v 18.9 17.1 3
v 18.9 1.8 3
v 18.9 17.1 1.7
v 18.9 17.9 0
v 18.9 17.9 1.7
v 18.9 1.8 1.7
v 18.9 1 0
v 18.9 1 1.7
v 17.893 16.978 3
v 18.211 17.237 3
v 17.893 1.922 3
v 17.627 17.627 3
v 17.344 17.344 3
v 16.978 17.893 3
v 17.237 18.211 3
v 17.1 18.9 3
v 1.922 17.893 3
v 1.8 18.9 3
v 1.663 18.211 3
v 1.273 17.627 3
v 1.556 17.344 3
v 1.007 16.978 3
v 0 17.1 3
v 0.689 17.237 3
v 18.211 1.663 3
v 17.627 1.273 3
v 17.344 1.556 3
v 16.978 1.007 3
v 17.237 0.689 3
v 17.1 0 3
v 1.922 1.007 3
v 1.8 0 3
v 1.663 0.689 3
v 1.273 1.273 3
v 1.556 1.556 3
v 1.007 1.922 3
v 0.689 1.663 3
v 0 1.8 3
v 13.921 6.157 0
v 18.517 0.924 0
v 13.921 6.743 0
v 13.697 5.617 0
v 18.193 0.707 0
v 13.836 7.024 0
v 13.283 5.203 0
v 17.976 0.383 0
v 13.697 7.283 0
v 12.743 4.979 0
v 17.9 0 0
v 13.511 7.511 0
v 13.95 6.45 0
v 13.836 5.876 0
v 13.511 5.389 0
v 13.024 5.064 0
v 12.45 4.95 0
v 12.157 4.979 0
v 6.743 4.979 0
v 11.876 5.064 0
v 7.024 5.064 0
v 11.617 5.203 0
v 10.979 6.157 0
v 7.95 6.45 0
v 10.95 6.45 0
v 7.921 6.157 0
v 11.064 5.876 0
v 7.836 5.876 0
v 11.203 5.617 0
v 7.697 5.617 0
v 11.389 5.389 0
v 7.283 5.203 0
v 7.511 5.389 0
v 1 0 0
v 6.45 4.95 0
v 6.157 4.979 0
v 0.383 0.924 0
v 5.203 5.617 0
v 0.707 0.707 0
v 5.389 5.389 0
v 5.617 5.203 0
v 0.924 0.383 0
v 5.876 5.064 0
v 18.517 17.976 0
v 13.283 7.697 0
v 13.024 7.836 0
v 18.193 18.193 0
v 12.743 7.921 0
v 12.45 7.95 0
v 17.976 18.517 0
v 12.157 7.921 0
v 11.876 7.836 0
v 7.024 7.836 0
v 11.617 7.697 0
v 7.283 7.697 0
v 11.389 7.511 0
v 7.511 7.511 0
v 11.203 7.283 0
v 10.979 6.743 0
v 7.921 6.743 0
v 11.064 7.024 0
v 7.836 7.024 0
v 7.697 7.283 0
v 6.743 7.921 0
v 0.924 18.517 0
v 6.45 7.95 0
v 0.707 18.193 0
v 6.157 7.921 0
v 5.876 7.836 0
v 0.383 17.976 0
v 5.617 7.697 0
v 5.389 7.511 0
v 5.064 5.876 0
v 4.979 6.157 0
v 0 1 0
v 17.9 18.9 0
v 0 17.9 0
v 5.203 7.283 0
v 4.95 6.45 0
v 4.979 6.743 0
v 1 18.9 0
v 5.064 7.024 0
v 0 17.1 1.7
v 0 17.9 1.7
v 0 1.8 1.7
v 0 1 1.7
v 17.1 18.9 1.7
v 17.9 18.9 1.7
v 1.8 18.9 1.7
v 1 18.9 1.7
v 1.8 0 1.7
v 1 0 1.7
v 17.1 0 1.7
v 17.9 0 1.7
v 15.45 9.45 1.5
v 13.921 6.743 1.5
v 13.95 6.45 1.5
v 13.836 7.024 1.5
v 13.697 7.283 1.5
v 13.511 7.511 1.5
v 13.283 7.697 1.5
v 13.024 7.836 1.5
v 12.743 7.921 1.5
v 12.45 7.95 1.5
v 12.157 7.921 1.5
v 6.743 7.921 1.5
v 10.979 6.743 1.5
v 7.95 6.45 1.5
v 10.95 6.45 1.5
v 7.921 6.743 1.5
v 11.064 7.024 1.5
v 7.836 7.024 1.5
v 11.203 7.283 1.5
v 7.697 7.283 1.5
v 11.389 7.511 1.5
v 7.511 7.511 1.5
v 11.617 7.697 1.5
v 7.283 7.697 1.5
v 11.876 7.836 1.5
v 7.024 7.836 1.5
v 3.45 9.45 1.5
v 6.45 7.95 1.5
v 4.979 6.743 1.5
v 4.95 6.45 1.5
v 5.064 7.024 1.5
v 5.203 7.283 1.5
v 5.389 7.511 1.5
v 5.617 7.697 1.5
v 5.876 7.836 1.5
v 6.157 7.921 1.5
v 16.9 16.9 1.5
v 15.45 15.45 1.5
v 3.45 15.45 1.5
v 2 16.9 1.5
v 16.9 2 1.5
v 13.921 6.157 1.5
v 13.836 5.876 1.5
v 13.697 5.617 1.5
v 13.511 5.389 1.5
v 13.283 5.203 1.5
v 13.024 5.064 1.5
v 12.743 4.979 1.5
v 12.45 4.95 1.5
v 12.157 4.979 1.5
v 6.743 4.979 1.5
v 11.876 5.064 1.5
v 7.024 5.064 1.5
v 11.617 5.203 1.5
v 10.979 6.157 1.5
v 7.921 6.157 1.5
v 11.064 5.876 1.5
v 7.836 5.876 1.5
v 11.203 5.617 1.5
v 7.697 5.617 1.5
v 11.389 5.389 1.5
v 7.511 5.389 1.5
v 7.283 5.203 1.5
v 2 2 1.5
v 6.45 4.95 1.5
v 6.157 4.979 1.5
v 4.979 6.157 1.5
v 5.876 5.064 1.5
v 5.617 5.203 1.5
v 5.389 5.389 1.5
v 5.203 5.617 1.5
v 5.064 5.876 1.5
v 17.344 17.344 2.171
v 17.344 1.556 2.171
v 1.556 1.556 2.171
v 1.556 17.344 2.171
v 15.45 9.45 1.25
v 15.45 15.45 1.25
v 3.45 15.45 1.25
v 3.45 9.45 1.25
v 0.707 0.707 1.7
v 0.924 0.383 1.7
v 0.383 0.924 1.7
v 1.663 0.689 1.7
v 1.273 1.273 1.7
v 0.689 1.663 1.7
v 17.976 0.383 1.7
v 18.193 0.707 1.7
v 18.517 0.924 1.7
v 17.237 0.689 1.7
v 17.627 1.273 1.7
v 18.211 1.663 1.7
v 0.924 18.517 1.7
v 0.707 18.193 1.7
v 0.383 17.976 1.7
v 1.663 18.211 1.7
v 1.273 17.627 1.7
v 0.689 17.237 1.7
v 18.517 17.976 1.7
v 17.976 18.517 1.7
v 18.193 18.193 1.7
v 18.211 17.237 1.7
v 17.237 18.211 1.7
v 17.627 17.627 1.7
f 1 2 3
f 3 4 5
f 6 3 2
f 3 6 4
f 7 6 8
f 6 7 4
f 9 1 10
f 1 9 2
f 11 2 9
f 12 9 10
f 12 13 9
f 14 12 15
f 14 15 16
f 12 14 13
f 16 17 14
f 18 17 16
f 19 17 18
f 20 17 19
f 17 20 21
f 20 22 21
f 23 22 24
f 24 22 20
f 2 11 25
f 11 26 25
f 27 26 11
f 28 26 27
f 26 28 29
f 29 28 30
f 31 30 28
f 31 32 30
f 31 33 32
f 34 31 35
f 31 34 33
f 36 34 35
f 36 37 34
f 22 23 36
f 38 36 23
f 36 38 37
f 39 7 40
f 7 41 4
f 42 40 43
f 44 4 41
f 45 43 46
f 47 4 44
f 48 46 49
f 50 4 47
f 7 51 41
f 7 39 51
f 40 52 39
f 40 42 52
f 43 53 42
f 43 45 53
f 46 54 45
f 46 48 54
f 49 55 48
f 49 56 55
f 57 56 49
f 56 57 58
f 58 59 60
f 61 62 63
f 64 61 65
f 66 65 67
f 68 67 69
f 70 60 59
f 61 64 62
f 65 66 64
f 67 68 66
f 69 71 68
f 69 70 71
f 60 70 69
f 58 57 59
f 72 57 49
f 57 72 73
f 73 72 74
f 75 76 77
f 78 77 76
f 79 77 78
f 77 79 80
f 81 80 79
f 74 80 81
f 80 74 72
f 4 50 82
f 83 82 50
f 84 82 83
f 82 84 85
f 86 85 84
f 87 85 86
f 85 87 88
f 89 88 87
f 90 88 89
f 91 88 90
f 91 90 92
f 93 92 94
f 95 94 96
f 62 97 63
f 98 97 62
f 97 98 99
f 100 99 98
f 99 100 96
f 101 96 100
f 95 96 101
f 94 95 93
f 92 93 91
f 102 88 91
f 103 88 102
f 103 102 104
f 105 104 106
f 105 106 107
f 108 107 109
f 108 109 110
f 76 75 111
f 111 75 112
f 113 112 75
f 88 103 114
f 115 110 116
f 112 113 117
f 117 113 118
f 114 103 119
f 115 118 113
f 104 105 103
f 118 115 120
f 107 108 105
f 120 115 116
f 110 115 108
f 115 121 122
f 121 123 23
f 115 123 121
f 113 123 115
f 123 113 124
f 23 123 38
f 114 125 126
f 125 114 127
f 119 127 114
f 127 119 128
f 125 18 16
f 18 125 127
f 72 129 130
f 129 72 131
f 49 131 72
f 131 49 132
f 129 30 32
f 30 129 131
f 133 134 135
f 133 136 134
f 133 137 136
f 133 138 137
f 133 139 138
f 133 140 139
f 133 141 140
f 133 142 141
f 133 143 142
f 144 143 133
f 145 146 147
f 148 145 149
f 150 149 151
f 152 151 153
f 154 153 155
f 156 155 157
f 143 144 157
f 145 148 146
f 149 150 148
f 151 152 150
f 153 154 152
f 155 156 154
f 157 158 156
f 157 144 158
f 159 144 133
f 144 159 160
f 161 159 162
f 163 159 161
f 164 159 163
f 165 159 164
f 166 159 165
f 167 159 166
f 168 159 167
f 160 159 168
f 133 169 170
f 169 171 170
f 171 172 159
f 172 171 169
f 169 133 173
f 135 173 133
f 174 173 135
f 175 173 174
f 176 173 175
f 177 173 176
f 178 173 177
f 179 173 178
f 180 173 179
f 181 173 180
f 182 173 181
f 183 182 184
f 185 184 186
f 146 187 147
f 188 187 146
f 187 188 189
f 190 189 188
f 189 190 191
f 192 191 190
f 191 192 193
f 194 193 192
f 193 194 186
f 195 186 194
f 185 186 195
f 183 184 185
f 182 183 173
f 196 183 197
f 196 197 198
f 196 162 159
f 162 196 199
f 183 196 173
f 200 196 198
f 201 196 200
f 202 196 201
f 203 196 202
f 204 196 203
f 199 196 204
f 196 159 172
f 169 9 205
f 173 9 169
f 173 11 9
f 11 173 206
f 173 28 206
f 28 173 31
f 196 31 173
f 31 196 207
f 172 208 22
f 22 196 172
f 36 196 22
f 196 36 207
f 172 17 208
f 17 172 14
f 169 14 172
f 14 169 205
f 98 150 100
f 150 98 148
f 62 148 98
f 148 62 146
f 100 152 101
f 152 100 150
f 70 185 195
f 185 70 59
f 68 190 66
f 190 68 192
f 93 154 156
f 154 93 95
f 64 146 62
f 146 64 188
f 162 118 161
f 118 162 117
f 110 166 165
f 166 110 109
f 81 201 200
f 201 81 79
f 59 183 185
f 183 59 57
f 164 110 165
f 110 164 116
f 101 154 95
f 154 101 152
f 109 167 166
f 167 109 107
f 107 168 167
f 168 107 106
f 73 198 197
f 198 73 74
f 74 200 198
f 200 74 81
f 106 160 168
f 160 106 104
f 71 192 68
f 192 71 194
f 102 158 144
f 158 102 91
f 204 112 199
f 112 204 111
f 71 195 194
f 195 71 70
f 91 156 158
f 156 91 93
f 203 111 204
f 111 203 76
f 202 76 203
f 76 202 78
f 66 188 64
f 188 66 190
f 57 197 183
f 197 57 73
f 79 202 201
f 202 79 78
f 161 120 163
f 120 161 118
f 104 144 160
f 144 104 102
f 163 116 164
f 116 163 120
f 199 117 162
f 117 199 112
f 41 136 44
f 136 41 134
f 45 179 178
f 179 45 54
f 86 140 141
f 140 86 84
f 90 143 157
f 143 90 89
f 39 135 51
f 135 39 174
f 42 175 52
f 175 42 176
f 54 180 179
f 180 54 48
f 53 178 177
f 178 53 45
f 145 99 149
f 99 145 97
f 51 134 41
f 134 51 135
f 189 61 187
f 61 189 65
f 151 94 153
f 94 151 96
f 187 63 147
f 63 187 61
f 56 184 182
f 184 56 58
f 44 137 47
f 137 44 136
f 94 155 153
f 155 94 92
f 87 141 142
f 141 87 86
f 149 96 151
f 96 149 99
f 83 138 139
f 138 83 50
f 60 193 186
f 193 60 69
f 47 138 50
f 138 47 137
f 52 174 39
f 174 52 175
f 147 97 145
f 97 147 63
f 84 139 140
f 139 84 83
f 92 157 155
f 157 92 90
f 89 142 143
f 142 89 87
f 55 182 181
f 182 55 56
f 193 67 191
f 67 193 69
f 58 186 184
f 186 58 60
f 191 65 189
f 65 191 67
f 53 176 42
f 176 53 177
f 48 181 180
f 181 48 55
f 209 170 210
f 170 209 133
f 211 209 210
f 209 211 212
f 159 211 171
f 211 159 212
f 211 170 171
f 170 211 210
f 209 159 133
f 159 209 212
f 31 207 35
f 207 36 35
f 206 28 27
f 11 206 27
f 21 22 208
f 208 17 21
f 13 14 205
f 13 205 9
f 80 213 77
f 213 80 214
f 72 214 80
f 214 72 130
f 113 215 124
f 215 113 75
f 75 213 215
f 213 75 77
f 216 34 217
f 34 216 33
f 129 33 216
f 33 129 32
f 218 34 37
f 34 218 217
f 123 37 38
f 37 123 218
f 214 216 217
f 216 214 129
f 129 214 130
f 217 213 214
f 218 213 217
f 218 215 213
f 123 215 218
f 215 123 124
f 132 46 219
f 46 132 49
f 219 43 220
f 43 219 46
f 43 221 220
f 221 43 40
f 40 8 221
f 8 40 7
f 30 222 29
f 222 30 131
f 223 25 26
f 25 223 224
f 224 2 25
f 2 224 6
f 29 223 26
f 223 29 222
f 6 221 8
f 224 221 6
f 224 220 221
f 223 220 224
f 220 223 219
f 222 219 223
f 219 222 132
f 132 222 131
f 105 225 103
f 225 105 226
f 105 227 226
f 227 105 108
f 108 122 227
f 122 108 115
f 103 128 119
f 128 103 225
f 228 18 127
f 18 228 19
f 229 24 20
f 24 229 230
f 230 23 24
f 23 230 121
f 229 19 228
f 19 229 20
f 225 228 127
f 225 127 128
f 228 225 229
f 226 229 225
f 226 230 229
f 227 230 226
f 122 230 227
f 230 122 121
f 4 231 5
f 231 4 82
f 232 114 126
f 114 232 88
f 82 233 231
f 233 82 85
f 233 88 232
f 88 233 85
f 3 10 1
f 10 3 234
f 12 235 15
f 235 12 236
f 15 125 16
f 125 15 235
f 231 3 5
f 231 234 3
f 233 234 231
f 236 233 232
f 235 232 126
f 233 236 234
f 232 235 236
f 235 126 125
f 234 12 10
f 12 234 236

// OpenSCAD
//OpenSCAD-Skript

//Moduldefinition mit Parametern für Frontplattensystem im 19mm-Raster
module FrontElem (
//Frontplattenelement
xwert=1,        //Anzahl der Segmente in horizontaler Richtung
ywert=1,        //Anzahl der Segmente in vertikaler Richtung
segment=18.9,   //Kantenlänge des Segments
hght=3.0,       //Höhe des Rands des Frontplattensegments
thick=1.5,      //verbleibende Dicke des Frontplattensegments
wo=1.0,         //Wandstärke oben
wu=2.0,         //Wandstärke unten
//M3-Schrauben
M3=false,       //Bohrungen für M3-Zylinderkopf-Inbusschraube
skd3=5.6,       //Schraubenkopfdurchmesser M3-Schraube
skh3=3.3,       //Schraubenkopfhöhe M3-Schraube
dsh3=3.1,       //Schaftdurchmesser M3-Schraube
dvst3=7,        //Verstärkung für M3-Schraube
//Schneidschrauben 2mmx6mm
B2mm=true,      //Bohrungen für 2mm-Schneidschrauben
skd2=3.6,       //Schraubenkopfdurchmesser 2mm-Schraube (4.4)
skh2=1.3,       //Schraubenkopfhöhe 2mm-Schraube
dsh2=2.0,       //Schaftdurchmesser 2mm-Schraube
dvst2=4.4,      //Verstärkung für 2mm-Schraube
//Beschriftungsfeld eingesenkt
Btext=6.0,      //Breite Beschriftungsband
Ltext=12,       //Länge Beschriftungsband
Dtext=0.3,      //Tiefe Beschriftungsfeld, oder Null
//LED 3mm
LEDdia=3.0,     //Durchmesser LED
//Quadrat-LED
LEDr=5.0,       //Kantenlänge quadratische LED
//Rechteck-LED
LEDB=5.0,       //Breite der Rechteck-LED
LEDH=3.0,       //Höhe der Rechteck-LED
//Hebel-Kippschalter
KSWdia=6.0,     //Schaftdurchmesser Kippschalter
//Drehschalter
RSWdia=9.2,     //Schaftdurchmesser Drehschalter
RSWdist=9.4,    //Mittenabstand Pin
RSWpin=3.0,     //Durchmesser Pin
//Bohrung für Potischaft 6mm
POTdia=6.8,     //Schaftdurchmesser Poti
//Polklemme M4
TRMdia=4.0,     //Bohrung für Polklemme M4
TRSdia=6.0,     //Bohrung für Telefonbuchse 4mm
//MC-Einbaubuchse
MCdia=11.8,     //Bohrung für MC-Buchse 4mm
MCdist=10.4,    //Abstand Abflachungen
//BNC-Einbaubuchse
BNCdia=9.5,     //Durchmesser Bohrung
BNCdist=8.0,    //Abstand Abflachung
//Panelmeter 3-stellig
PM3B=22.5,      //Breite Panelmeter 3-stellig
PM3H=14.5,      //Höhe Panelmeter 3-stellig
//Panelmeter 4-stellig
PM4B=30.0,      //Breite Panelmeter 4-stellig
PM4H=14.2,      //Höhe Panelmeter 4-stellig
//Kaltgerätestecker
KGSW=27.3,      //Länge Ausschnitt in x-Richtung Kaltgerätestecker
KGSH=20,        //Höhe Ausschnitt in y-Richtung Kaltgerätestecker
KGSR=9          //Rundungsdurchmesser Ausschnitt Kaltgerätestecker

)
//Beginn Modul
{
difference(){   //difference 1
union(){        //union 1
difference(){   //difference 2
union(){        //union 2
    //alles, was vor der nächsten geschweiften Klammer steht, wird zusammengefügt (union 2)
//Körper des Frontplattensegments
cube([xwert*segment, ywert*segment, hght]);


}               //union 2 end
    //alles, was vor der nächsten geschweiften Klammer steht, wird davon abgezogen (difference 2)
//Einsenkung in das Segment
polyhedron(
               points= [[wu,wu,thick],                                  //0 unten
                        [xwert*segment-wu,wu,thick],                    //1 unten
                        [xwert*segment-wu,ywert*segment-wu,thick],      //2 unten
                        [wu,ywert*segment-wu,thick],                    //3 unten
                        [wo,wo,hght+0.01],                              //4 oben
                        [wo,ywert*segment-wo, hght+0.01],               //5 oben
                        [xwert*segment-wo,ywert*segment-wo,hght+0.01],  //6 oben
                        [xwert*segment-wo,wo,hght+0.01],                //7 oben
                       ],
               faces=  [[0,1,2,3],      //Boden
                        [0,4,7,1],      //Deckel
                        [1,7,6,2],      //Front
                        [2,6,5,3],      //Seitenwand rechts
                        [3,5,4,0],      //Rückwand
                        [4,5,6,7]]      //Seitenwand links
               );   
/*
//Bohrung für LED mittig (Mindestgröße 1x1)
translate([xwert*segment/2,ywert*segment/2-3,-0.1])  cylinder(d=LEDdia, h=10, $fn=32);
*/


//Bohrung für 2x 3mm-LED nach unten versetzt mit Textfeld darüber (Mindestgröße 1x1, bei 10mm LED 1x2)
translate([xwert*segment/2-3,ywert*segment/2-3,-0.1])  cylinder(d=LEDdia, h=10, $fn=32);
translate([xwert*segment/2+3,ywert*segment/2-3,-0.1])  cylinder(d=LEDdia, h=10, $fn=32);
translate([xwert*segment/2-Ltext/2,ywert*segment/2,thick-Dtext+0.05])  cube([Ltext, Btext, Dtext]); 


/*
//Bohrung für Kippschalter mittig (Mindestgröße 1x1)
translate([xwert*segment/2,ywert*segment/2,-0.1])  cylinder(d=KSWdia, h=10, $fn=32); 
*/

/*
//Bohrungen für Drehschalter mit Pin (Mindestgröße 2x2)
translate([xwert*segment/2,ywert*segment/2,-0.1])  cylinder(d=RSWdia, h=10, $fn=32);
translate([xwert*segment/2+RSWdist,ywert*segment/2,-0.1])  cylinder(d=RSWpin, h=1.5, $fn=32);
*/

/*
//Bohrung für Potentiometer 3mm-Schaft (Mindestgröße 1x1)
translate([xwert*segment/2,ywert*segment/2,-0.1])  cylinder(d=POTdia, h=10, $fn=32);
*/

/*
//Bohrung für 4mm-Polklemme M4 (Mindestgröße 1x1)
translate([xwert*segment/2,ywert*segment/2,-0.1])  cylinder(d=TRMdia, h=10, $fn=32);
*/       

/*
//Bohrung für 4mm-Telefonbuchse (Mindestgröße 1x1)
translate([xwert*segment/2,ywert*segment/2,-0.1])  cylinder(d=TRSdia, h=10, $fn=32);
*/

/*
//Bohrung für 4mm-MC-Buchse (Mindestgröße 2x2), siehe auch union1 für Abflachungen
translate([xwert*segment/2,ywert*segment/2,-0.1])  cylinder(d=MCdia, h=10, $fn=32);
*/

/*
//Bohrung für BNC-Buchse (Mindestgröße 1x1), siehe auch union1 für Abflachungen
translate([xwert*segment/2,ywert*segment/2,-0.1])  cylinder(d=BNCdia, h=10, $fn=32);
*/

/*
//Ausschnitt Panelmeter 3-stellig (Mindestgröße 2x1)
translate([xwert*segment/2-PM3B/2,ywert*segment/2-PM3H/2,-0.1])  cube([PM3B, PM3H, 10]);
*/

/*
//Ausschnitt Panelmeter 4-stellig (Mindestgröße 2x1)
translate([xwert*segment/2-PM4B/2,ywert*segment/2-PM4H/2,-0.1])  cube([PM4B, PM4H, 10]);
*/       
        
}  //difference 2 end
    //alles, was vor der nächsten geschweiften Klammer steht, wird dazu hinzugefügt (union 1)
//Verstärkungen für Schrauben x-Achse unten
for (x=[0:segment:xwert*segment])
{
if (M3==true) translate([x,0,0]) cylinder(d=dvst3,h=hght,$fn=16);
if (B2mm==true) translate([x,0,0]) cylinder(d=dvst2,h=hght,$fn=16);
}
//Verstärkungen für Schrauben x-Achse oben
for (x=[0:segment:xwert*segment])
{
if (M3==true) translate([x,ywert*segment,0]) cylinder(d=dvst3,h=hght,$fn=16);
if (B2mm==true) translate([x,ywert*segment,0]) cylinder(d=dvst2,h=hght,$fn=16);
}
//Verstärkungen für Schrauben y-Achse links
for (y=[0:segment:ywert*segment])
{
if (M3==true) translate([0,y,0]) cylinder(d=dvst3,h=hght,$fn=16);
if (B2mm==true) translate([0,y,0]) cylinder(d=dvst2,h=hght,$fn=16);
}
//Verstärkungen für Schrauben y-Achse rechts
for (y=[0:segment:ywert*segment])
{
if (M3==true) translate([xwert*segment,y,0]) cylinder(d=dvst3,h=hght,$fn=16);
if (B2mm==true) translate([xwert*segment,y,0]) cylinder(d=dvst2,h=hght,$fn=16);
}

/*
//Abflachungen für 4mm-MC-Buchse (Mindestgröße 2x2)
translate([xwert*segment/2-5,ywert*segment/2+MCdist/2,0])  cube([10,3,thick]);
translate([xwert*segment/2-5,ywert*segment/2-MCdist/2-3,0])  cube([10,3,thick]);
*/

/*
//Abflachungen für BNC-Buchse (Mindestgröße 1x1)
translate([xwert*segment/2-5,ywert*segment/2+BNCdist/2,0])  cube([10,3,thick]);
translate([xwert*segment/2-5,ywert*segment/2-BNCdist/2-3,0])  cube([10,3,thick]);
*/

}               //union 1 end
    //alles, was vor der nächsten geschweiften Klammer steht, wird davon wieder abgezogen (difference 1)
//Bohrungen für Schrauben x-Achse unten
for (x=[0:segment:xwert*segment])
{
if (M3==true) translate([x,0,-0.1]) cylinder(d=dsh3,h=2*hght,$fn=16);
if (M3==true) translate([x,0,hght-skh3]) cylinder(d=skd3,h=2*hght,$fn=16);
if (B2mm==true) translate([x,0,-0.1]) cylinder(d=dsh2,h=2*hght,$fn=16);
if (B2mm==true) translate([x,0,hght-skh2]) cylinder(d=skd2,h=2*hght,$fn=16); 
}
//Bohrungen für Schrauben x-Achse oben
for (x=[0:segment:xwert*segment])
{
if (M3==true) translate([x,ywert*segment,-0.1]) cylinder(d=dsh3,h=2*hght,$fn=16);
if (M3==true) translate([x,ywert*segment,hght-skh3]) cylinder(d=skd3,h=2*hght,$fn=16);
if (B2mm==true) translate([x,ywert*segment,-0.1]) cylinder(d=dsh2,h=2*hght,$fn=16);
if (B2mm==true) translate([x,ywert*segment,hght-skh2]) cylinder(d=skd2,h=2*hght,$fn=16); 
}
//Bohrungen für Schrauben y-Achse links
for (y=[0:segment:ywert*segment])
{
if (M3==true) translate([0,y,-0.1]) cylinder(d=dsh3,h=2*hght,$fn=16);
if (M3==true) translate([0,y,hght-skh3]) cylinder(d=skd3,h=2*hght,$fn=16);
if (B2mm==true) translate([0,y,-0.1]) cylinder(d=dsh2,h=2*hght,$fn=16);
if (B2mm==true) translate([0,y,hght-skh2]) cylinder(d=skd2,h=2*hght,$fn=16); 
}
//Bohrungen für Schrauben y-Achse rechts
for (y=[0:segment:ywert*segment])
{
if (M3==true) translate([xwert*segment,y,-0.1]) cylinder(d=dsh3,h=2*hght,$fn=16);
if (M3==true) translate([xwert*segment,y,hght-skh3]) cylinder(d=skd3,h=2*hght,$fn=16);
if (B2mm==true) translate([xwert*segment,y,-0.1]) cylinder(d=dsh2,h=2*hght,$fn=16);
if (B2mm==true) translate([xwert*segment,y,hght-skh2]) cylinder(d=skd2,h=2*hght,$fn=16); 
}
//Abschneiden Verstärkungen unten
translate([-250,-10,-0.1])
cube([500,10,25]);
//Abschneiden Verstärkungen oben
translate([-250,ywert*segment,-0.1])
cube([500,10,25]);
//Abschneiden Verstärkungen links
translate([-10,-250,-0.1])
cube([10,500,25]);
//Abschneiden Verstärkungen rechts
translate([xwert*segment,-250,-0.1])
cube([10,500,25]);
}               //difference 1 end

}  //module end

//Hier werden Instanzen des Moduls aufgerufen
translate([0,0,0]) FrontElem();
